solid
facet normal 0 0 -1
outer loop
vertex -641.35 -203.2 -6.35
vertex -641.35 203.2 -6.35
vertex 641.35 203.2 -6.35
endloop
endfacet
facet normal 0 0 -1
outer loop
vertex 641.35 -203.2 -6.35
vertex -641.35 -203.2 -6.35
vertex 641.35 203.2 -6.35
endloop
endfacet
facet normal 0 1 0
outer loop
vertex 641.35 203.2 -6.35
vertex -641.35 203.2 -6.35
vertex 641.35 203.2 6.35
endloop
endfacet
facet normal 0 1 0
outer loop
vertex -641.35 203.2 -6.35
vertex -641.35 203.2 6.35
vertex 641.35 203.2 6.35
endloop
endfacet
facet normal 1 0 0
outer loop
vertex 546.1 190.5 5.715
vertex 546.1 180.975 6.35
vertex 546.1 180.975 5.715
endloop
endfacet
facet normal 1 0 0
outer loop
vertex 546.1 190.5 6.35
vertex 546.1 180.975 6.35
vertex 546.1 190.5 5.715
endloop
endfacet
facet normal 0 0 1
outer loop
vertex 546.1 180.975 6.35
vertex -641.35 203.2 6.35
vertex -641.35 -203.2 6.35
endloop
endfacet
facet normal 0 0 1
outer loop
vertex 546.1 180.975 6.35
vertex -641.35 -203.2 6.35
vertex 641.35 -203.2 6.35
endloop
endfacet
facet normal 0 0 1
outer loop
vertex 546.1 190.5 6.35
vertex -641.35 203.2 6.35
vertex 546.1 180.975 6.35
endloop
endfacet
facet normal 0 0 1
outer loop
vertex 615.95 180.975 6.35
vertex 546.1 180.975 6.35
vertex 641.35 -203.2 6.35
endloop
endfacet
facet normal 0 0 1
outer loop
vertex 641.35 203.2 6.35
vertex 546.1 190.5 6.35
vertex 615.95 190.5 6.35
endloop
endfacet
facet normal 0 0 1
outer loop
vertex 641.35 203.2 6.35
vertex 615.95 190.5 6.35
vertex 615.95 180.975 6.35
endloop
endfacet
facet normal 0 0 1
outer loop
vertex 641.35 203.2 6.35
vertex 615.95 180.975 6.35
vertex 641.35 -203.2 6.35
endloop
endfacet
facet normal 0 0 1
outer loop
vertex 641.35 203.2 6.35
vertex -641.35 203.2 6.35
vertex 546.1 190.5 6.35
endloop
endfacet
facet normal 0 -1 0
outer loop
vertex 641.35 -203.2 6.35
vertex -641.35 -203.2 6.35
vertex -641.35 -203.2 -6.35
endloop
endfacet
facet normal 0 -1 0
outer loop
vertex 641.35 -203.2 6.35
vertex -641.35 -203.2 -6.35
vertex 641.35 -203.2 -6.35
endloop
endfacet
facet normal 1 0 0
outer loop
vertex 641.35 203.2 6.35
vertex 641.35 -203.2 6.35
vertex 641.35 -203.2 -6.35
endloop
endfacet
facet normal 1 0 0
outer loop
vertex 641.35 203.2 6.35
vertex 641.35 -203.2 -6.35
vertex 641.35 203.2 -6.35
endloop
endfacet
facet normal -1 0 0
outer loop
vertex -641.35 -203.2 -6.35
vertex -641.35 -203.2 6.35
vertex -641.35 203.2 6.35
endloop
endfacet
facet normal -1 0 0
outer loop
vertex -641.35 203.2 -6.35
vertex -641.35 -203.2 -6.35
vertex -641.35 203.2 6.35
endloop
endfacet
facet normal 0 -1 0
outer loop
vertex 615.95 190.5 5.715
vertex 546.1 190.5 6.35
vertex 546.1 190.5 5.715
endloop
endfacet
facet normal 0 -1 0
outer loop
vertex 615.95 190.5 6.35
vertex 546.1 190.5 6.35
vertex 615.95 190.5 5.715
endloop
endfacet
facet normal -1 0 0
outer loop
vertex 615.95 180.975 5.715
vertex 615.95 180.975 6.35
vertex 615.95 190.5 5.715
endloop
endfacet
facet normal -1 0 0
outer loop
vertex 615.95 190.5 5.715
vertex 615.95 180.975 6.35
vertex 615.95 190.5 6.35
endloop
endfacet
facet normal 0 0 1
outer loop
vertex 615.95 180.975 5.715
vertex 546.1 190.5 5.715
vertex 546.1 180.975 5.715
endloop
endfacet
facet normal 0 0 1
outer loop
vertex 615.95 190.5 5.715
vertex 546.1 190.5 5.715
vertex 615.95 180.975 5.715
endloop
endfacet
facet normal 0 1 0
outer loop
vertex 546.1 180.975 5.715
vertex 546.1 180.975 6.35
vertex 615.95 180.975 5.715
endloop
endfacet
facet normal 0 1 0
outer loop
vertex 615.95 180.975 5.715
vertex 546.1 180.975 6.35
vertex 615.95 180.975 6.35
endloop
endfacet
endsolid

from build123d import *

# Parameters (mm, degrees)
F0_W     = 1282.7
F0_H     = 406.4
F1_DEPTH = 6.35
F2_W     = 69.85
F2_H     = 9.525
F3_DEPTH = 0.635


with BuildPart() as f1:
    # F0 (on Top) → F1 (new body, symmetric)
    with BuildSketch(Plane.XY):
        Rectangle(F0_W, F0_H)
    extrude(amount=F1_DEPTH, both=True)

    # F2 (on face) → F3 (cut)
    with BuildSketch(Plane.XY.offset(6.35)):
        with Locations((581.025, 185.7375)):
            Rectangle(F2_W, F2_H)
    extrude(amount=-F3_DEPTH, mode=Mode.SUBTRACT)


solid = f1.part
